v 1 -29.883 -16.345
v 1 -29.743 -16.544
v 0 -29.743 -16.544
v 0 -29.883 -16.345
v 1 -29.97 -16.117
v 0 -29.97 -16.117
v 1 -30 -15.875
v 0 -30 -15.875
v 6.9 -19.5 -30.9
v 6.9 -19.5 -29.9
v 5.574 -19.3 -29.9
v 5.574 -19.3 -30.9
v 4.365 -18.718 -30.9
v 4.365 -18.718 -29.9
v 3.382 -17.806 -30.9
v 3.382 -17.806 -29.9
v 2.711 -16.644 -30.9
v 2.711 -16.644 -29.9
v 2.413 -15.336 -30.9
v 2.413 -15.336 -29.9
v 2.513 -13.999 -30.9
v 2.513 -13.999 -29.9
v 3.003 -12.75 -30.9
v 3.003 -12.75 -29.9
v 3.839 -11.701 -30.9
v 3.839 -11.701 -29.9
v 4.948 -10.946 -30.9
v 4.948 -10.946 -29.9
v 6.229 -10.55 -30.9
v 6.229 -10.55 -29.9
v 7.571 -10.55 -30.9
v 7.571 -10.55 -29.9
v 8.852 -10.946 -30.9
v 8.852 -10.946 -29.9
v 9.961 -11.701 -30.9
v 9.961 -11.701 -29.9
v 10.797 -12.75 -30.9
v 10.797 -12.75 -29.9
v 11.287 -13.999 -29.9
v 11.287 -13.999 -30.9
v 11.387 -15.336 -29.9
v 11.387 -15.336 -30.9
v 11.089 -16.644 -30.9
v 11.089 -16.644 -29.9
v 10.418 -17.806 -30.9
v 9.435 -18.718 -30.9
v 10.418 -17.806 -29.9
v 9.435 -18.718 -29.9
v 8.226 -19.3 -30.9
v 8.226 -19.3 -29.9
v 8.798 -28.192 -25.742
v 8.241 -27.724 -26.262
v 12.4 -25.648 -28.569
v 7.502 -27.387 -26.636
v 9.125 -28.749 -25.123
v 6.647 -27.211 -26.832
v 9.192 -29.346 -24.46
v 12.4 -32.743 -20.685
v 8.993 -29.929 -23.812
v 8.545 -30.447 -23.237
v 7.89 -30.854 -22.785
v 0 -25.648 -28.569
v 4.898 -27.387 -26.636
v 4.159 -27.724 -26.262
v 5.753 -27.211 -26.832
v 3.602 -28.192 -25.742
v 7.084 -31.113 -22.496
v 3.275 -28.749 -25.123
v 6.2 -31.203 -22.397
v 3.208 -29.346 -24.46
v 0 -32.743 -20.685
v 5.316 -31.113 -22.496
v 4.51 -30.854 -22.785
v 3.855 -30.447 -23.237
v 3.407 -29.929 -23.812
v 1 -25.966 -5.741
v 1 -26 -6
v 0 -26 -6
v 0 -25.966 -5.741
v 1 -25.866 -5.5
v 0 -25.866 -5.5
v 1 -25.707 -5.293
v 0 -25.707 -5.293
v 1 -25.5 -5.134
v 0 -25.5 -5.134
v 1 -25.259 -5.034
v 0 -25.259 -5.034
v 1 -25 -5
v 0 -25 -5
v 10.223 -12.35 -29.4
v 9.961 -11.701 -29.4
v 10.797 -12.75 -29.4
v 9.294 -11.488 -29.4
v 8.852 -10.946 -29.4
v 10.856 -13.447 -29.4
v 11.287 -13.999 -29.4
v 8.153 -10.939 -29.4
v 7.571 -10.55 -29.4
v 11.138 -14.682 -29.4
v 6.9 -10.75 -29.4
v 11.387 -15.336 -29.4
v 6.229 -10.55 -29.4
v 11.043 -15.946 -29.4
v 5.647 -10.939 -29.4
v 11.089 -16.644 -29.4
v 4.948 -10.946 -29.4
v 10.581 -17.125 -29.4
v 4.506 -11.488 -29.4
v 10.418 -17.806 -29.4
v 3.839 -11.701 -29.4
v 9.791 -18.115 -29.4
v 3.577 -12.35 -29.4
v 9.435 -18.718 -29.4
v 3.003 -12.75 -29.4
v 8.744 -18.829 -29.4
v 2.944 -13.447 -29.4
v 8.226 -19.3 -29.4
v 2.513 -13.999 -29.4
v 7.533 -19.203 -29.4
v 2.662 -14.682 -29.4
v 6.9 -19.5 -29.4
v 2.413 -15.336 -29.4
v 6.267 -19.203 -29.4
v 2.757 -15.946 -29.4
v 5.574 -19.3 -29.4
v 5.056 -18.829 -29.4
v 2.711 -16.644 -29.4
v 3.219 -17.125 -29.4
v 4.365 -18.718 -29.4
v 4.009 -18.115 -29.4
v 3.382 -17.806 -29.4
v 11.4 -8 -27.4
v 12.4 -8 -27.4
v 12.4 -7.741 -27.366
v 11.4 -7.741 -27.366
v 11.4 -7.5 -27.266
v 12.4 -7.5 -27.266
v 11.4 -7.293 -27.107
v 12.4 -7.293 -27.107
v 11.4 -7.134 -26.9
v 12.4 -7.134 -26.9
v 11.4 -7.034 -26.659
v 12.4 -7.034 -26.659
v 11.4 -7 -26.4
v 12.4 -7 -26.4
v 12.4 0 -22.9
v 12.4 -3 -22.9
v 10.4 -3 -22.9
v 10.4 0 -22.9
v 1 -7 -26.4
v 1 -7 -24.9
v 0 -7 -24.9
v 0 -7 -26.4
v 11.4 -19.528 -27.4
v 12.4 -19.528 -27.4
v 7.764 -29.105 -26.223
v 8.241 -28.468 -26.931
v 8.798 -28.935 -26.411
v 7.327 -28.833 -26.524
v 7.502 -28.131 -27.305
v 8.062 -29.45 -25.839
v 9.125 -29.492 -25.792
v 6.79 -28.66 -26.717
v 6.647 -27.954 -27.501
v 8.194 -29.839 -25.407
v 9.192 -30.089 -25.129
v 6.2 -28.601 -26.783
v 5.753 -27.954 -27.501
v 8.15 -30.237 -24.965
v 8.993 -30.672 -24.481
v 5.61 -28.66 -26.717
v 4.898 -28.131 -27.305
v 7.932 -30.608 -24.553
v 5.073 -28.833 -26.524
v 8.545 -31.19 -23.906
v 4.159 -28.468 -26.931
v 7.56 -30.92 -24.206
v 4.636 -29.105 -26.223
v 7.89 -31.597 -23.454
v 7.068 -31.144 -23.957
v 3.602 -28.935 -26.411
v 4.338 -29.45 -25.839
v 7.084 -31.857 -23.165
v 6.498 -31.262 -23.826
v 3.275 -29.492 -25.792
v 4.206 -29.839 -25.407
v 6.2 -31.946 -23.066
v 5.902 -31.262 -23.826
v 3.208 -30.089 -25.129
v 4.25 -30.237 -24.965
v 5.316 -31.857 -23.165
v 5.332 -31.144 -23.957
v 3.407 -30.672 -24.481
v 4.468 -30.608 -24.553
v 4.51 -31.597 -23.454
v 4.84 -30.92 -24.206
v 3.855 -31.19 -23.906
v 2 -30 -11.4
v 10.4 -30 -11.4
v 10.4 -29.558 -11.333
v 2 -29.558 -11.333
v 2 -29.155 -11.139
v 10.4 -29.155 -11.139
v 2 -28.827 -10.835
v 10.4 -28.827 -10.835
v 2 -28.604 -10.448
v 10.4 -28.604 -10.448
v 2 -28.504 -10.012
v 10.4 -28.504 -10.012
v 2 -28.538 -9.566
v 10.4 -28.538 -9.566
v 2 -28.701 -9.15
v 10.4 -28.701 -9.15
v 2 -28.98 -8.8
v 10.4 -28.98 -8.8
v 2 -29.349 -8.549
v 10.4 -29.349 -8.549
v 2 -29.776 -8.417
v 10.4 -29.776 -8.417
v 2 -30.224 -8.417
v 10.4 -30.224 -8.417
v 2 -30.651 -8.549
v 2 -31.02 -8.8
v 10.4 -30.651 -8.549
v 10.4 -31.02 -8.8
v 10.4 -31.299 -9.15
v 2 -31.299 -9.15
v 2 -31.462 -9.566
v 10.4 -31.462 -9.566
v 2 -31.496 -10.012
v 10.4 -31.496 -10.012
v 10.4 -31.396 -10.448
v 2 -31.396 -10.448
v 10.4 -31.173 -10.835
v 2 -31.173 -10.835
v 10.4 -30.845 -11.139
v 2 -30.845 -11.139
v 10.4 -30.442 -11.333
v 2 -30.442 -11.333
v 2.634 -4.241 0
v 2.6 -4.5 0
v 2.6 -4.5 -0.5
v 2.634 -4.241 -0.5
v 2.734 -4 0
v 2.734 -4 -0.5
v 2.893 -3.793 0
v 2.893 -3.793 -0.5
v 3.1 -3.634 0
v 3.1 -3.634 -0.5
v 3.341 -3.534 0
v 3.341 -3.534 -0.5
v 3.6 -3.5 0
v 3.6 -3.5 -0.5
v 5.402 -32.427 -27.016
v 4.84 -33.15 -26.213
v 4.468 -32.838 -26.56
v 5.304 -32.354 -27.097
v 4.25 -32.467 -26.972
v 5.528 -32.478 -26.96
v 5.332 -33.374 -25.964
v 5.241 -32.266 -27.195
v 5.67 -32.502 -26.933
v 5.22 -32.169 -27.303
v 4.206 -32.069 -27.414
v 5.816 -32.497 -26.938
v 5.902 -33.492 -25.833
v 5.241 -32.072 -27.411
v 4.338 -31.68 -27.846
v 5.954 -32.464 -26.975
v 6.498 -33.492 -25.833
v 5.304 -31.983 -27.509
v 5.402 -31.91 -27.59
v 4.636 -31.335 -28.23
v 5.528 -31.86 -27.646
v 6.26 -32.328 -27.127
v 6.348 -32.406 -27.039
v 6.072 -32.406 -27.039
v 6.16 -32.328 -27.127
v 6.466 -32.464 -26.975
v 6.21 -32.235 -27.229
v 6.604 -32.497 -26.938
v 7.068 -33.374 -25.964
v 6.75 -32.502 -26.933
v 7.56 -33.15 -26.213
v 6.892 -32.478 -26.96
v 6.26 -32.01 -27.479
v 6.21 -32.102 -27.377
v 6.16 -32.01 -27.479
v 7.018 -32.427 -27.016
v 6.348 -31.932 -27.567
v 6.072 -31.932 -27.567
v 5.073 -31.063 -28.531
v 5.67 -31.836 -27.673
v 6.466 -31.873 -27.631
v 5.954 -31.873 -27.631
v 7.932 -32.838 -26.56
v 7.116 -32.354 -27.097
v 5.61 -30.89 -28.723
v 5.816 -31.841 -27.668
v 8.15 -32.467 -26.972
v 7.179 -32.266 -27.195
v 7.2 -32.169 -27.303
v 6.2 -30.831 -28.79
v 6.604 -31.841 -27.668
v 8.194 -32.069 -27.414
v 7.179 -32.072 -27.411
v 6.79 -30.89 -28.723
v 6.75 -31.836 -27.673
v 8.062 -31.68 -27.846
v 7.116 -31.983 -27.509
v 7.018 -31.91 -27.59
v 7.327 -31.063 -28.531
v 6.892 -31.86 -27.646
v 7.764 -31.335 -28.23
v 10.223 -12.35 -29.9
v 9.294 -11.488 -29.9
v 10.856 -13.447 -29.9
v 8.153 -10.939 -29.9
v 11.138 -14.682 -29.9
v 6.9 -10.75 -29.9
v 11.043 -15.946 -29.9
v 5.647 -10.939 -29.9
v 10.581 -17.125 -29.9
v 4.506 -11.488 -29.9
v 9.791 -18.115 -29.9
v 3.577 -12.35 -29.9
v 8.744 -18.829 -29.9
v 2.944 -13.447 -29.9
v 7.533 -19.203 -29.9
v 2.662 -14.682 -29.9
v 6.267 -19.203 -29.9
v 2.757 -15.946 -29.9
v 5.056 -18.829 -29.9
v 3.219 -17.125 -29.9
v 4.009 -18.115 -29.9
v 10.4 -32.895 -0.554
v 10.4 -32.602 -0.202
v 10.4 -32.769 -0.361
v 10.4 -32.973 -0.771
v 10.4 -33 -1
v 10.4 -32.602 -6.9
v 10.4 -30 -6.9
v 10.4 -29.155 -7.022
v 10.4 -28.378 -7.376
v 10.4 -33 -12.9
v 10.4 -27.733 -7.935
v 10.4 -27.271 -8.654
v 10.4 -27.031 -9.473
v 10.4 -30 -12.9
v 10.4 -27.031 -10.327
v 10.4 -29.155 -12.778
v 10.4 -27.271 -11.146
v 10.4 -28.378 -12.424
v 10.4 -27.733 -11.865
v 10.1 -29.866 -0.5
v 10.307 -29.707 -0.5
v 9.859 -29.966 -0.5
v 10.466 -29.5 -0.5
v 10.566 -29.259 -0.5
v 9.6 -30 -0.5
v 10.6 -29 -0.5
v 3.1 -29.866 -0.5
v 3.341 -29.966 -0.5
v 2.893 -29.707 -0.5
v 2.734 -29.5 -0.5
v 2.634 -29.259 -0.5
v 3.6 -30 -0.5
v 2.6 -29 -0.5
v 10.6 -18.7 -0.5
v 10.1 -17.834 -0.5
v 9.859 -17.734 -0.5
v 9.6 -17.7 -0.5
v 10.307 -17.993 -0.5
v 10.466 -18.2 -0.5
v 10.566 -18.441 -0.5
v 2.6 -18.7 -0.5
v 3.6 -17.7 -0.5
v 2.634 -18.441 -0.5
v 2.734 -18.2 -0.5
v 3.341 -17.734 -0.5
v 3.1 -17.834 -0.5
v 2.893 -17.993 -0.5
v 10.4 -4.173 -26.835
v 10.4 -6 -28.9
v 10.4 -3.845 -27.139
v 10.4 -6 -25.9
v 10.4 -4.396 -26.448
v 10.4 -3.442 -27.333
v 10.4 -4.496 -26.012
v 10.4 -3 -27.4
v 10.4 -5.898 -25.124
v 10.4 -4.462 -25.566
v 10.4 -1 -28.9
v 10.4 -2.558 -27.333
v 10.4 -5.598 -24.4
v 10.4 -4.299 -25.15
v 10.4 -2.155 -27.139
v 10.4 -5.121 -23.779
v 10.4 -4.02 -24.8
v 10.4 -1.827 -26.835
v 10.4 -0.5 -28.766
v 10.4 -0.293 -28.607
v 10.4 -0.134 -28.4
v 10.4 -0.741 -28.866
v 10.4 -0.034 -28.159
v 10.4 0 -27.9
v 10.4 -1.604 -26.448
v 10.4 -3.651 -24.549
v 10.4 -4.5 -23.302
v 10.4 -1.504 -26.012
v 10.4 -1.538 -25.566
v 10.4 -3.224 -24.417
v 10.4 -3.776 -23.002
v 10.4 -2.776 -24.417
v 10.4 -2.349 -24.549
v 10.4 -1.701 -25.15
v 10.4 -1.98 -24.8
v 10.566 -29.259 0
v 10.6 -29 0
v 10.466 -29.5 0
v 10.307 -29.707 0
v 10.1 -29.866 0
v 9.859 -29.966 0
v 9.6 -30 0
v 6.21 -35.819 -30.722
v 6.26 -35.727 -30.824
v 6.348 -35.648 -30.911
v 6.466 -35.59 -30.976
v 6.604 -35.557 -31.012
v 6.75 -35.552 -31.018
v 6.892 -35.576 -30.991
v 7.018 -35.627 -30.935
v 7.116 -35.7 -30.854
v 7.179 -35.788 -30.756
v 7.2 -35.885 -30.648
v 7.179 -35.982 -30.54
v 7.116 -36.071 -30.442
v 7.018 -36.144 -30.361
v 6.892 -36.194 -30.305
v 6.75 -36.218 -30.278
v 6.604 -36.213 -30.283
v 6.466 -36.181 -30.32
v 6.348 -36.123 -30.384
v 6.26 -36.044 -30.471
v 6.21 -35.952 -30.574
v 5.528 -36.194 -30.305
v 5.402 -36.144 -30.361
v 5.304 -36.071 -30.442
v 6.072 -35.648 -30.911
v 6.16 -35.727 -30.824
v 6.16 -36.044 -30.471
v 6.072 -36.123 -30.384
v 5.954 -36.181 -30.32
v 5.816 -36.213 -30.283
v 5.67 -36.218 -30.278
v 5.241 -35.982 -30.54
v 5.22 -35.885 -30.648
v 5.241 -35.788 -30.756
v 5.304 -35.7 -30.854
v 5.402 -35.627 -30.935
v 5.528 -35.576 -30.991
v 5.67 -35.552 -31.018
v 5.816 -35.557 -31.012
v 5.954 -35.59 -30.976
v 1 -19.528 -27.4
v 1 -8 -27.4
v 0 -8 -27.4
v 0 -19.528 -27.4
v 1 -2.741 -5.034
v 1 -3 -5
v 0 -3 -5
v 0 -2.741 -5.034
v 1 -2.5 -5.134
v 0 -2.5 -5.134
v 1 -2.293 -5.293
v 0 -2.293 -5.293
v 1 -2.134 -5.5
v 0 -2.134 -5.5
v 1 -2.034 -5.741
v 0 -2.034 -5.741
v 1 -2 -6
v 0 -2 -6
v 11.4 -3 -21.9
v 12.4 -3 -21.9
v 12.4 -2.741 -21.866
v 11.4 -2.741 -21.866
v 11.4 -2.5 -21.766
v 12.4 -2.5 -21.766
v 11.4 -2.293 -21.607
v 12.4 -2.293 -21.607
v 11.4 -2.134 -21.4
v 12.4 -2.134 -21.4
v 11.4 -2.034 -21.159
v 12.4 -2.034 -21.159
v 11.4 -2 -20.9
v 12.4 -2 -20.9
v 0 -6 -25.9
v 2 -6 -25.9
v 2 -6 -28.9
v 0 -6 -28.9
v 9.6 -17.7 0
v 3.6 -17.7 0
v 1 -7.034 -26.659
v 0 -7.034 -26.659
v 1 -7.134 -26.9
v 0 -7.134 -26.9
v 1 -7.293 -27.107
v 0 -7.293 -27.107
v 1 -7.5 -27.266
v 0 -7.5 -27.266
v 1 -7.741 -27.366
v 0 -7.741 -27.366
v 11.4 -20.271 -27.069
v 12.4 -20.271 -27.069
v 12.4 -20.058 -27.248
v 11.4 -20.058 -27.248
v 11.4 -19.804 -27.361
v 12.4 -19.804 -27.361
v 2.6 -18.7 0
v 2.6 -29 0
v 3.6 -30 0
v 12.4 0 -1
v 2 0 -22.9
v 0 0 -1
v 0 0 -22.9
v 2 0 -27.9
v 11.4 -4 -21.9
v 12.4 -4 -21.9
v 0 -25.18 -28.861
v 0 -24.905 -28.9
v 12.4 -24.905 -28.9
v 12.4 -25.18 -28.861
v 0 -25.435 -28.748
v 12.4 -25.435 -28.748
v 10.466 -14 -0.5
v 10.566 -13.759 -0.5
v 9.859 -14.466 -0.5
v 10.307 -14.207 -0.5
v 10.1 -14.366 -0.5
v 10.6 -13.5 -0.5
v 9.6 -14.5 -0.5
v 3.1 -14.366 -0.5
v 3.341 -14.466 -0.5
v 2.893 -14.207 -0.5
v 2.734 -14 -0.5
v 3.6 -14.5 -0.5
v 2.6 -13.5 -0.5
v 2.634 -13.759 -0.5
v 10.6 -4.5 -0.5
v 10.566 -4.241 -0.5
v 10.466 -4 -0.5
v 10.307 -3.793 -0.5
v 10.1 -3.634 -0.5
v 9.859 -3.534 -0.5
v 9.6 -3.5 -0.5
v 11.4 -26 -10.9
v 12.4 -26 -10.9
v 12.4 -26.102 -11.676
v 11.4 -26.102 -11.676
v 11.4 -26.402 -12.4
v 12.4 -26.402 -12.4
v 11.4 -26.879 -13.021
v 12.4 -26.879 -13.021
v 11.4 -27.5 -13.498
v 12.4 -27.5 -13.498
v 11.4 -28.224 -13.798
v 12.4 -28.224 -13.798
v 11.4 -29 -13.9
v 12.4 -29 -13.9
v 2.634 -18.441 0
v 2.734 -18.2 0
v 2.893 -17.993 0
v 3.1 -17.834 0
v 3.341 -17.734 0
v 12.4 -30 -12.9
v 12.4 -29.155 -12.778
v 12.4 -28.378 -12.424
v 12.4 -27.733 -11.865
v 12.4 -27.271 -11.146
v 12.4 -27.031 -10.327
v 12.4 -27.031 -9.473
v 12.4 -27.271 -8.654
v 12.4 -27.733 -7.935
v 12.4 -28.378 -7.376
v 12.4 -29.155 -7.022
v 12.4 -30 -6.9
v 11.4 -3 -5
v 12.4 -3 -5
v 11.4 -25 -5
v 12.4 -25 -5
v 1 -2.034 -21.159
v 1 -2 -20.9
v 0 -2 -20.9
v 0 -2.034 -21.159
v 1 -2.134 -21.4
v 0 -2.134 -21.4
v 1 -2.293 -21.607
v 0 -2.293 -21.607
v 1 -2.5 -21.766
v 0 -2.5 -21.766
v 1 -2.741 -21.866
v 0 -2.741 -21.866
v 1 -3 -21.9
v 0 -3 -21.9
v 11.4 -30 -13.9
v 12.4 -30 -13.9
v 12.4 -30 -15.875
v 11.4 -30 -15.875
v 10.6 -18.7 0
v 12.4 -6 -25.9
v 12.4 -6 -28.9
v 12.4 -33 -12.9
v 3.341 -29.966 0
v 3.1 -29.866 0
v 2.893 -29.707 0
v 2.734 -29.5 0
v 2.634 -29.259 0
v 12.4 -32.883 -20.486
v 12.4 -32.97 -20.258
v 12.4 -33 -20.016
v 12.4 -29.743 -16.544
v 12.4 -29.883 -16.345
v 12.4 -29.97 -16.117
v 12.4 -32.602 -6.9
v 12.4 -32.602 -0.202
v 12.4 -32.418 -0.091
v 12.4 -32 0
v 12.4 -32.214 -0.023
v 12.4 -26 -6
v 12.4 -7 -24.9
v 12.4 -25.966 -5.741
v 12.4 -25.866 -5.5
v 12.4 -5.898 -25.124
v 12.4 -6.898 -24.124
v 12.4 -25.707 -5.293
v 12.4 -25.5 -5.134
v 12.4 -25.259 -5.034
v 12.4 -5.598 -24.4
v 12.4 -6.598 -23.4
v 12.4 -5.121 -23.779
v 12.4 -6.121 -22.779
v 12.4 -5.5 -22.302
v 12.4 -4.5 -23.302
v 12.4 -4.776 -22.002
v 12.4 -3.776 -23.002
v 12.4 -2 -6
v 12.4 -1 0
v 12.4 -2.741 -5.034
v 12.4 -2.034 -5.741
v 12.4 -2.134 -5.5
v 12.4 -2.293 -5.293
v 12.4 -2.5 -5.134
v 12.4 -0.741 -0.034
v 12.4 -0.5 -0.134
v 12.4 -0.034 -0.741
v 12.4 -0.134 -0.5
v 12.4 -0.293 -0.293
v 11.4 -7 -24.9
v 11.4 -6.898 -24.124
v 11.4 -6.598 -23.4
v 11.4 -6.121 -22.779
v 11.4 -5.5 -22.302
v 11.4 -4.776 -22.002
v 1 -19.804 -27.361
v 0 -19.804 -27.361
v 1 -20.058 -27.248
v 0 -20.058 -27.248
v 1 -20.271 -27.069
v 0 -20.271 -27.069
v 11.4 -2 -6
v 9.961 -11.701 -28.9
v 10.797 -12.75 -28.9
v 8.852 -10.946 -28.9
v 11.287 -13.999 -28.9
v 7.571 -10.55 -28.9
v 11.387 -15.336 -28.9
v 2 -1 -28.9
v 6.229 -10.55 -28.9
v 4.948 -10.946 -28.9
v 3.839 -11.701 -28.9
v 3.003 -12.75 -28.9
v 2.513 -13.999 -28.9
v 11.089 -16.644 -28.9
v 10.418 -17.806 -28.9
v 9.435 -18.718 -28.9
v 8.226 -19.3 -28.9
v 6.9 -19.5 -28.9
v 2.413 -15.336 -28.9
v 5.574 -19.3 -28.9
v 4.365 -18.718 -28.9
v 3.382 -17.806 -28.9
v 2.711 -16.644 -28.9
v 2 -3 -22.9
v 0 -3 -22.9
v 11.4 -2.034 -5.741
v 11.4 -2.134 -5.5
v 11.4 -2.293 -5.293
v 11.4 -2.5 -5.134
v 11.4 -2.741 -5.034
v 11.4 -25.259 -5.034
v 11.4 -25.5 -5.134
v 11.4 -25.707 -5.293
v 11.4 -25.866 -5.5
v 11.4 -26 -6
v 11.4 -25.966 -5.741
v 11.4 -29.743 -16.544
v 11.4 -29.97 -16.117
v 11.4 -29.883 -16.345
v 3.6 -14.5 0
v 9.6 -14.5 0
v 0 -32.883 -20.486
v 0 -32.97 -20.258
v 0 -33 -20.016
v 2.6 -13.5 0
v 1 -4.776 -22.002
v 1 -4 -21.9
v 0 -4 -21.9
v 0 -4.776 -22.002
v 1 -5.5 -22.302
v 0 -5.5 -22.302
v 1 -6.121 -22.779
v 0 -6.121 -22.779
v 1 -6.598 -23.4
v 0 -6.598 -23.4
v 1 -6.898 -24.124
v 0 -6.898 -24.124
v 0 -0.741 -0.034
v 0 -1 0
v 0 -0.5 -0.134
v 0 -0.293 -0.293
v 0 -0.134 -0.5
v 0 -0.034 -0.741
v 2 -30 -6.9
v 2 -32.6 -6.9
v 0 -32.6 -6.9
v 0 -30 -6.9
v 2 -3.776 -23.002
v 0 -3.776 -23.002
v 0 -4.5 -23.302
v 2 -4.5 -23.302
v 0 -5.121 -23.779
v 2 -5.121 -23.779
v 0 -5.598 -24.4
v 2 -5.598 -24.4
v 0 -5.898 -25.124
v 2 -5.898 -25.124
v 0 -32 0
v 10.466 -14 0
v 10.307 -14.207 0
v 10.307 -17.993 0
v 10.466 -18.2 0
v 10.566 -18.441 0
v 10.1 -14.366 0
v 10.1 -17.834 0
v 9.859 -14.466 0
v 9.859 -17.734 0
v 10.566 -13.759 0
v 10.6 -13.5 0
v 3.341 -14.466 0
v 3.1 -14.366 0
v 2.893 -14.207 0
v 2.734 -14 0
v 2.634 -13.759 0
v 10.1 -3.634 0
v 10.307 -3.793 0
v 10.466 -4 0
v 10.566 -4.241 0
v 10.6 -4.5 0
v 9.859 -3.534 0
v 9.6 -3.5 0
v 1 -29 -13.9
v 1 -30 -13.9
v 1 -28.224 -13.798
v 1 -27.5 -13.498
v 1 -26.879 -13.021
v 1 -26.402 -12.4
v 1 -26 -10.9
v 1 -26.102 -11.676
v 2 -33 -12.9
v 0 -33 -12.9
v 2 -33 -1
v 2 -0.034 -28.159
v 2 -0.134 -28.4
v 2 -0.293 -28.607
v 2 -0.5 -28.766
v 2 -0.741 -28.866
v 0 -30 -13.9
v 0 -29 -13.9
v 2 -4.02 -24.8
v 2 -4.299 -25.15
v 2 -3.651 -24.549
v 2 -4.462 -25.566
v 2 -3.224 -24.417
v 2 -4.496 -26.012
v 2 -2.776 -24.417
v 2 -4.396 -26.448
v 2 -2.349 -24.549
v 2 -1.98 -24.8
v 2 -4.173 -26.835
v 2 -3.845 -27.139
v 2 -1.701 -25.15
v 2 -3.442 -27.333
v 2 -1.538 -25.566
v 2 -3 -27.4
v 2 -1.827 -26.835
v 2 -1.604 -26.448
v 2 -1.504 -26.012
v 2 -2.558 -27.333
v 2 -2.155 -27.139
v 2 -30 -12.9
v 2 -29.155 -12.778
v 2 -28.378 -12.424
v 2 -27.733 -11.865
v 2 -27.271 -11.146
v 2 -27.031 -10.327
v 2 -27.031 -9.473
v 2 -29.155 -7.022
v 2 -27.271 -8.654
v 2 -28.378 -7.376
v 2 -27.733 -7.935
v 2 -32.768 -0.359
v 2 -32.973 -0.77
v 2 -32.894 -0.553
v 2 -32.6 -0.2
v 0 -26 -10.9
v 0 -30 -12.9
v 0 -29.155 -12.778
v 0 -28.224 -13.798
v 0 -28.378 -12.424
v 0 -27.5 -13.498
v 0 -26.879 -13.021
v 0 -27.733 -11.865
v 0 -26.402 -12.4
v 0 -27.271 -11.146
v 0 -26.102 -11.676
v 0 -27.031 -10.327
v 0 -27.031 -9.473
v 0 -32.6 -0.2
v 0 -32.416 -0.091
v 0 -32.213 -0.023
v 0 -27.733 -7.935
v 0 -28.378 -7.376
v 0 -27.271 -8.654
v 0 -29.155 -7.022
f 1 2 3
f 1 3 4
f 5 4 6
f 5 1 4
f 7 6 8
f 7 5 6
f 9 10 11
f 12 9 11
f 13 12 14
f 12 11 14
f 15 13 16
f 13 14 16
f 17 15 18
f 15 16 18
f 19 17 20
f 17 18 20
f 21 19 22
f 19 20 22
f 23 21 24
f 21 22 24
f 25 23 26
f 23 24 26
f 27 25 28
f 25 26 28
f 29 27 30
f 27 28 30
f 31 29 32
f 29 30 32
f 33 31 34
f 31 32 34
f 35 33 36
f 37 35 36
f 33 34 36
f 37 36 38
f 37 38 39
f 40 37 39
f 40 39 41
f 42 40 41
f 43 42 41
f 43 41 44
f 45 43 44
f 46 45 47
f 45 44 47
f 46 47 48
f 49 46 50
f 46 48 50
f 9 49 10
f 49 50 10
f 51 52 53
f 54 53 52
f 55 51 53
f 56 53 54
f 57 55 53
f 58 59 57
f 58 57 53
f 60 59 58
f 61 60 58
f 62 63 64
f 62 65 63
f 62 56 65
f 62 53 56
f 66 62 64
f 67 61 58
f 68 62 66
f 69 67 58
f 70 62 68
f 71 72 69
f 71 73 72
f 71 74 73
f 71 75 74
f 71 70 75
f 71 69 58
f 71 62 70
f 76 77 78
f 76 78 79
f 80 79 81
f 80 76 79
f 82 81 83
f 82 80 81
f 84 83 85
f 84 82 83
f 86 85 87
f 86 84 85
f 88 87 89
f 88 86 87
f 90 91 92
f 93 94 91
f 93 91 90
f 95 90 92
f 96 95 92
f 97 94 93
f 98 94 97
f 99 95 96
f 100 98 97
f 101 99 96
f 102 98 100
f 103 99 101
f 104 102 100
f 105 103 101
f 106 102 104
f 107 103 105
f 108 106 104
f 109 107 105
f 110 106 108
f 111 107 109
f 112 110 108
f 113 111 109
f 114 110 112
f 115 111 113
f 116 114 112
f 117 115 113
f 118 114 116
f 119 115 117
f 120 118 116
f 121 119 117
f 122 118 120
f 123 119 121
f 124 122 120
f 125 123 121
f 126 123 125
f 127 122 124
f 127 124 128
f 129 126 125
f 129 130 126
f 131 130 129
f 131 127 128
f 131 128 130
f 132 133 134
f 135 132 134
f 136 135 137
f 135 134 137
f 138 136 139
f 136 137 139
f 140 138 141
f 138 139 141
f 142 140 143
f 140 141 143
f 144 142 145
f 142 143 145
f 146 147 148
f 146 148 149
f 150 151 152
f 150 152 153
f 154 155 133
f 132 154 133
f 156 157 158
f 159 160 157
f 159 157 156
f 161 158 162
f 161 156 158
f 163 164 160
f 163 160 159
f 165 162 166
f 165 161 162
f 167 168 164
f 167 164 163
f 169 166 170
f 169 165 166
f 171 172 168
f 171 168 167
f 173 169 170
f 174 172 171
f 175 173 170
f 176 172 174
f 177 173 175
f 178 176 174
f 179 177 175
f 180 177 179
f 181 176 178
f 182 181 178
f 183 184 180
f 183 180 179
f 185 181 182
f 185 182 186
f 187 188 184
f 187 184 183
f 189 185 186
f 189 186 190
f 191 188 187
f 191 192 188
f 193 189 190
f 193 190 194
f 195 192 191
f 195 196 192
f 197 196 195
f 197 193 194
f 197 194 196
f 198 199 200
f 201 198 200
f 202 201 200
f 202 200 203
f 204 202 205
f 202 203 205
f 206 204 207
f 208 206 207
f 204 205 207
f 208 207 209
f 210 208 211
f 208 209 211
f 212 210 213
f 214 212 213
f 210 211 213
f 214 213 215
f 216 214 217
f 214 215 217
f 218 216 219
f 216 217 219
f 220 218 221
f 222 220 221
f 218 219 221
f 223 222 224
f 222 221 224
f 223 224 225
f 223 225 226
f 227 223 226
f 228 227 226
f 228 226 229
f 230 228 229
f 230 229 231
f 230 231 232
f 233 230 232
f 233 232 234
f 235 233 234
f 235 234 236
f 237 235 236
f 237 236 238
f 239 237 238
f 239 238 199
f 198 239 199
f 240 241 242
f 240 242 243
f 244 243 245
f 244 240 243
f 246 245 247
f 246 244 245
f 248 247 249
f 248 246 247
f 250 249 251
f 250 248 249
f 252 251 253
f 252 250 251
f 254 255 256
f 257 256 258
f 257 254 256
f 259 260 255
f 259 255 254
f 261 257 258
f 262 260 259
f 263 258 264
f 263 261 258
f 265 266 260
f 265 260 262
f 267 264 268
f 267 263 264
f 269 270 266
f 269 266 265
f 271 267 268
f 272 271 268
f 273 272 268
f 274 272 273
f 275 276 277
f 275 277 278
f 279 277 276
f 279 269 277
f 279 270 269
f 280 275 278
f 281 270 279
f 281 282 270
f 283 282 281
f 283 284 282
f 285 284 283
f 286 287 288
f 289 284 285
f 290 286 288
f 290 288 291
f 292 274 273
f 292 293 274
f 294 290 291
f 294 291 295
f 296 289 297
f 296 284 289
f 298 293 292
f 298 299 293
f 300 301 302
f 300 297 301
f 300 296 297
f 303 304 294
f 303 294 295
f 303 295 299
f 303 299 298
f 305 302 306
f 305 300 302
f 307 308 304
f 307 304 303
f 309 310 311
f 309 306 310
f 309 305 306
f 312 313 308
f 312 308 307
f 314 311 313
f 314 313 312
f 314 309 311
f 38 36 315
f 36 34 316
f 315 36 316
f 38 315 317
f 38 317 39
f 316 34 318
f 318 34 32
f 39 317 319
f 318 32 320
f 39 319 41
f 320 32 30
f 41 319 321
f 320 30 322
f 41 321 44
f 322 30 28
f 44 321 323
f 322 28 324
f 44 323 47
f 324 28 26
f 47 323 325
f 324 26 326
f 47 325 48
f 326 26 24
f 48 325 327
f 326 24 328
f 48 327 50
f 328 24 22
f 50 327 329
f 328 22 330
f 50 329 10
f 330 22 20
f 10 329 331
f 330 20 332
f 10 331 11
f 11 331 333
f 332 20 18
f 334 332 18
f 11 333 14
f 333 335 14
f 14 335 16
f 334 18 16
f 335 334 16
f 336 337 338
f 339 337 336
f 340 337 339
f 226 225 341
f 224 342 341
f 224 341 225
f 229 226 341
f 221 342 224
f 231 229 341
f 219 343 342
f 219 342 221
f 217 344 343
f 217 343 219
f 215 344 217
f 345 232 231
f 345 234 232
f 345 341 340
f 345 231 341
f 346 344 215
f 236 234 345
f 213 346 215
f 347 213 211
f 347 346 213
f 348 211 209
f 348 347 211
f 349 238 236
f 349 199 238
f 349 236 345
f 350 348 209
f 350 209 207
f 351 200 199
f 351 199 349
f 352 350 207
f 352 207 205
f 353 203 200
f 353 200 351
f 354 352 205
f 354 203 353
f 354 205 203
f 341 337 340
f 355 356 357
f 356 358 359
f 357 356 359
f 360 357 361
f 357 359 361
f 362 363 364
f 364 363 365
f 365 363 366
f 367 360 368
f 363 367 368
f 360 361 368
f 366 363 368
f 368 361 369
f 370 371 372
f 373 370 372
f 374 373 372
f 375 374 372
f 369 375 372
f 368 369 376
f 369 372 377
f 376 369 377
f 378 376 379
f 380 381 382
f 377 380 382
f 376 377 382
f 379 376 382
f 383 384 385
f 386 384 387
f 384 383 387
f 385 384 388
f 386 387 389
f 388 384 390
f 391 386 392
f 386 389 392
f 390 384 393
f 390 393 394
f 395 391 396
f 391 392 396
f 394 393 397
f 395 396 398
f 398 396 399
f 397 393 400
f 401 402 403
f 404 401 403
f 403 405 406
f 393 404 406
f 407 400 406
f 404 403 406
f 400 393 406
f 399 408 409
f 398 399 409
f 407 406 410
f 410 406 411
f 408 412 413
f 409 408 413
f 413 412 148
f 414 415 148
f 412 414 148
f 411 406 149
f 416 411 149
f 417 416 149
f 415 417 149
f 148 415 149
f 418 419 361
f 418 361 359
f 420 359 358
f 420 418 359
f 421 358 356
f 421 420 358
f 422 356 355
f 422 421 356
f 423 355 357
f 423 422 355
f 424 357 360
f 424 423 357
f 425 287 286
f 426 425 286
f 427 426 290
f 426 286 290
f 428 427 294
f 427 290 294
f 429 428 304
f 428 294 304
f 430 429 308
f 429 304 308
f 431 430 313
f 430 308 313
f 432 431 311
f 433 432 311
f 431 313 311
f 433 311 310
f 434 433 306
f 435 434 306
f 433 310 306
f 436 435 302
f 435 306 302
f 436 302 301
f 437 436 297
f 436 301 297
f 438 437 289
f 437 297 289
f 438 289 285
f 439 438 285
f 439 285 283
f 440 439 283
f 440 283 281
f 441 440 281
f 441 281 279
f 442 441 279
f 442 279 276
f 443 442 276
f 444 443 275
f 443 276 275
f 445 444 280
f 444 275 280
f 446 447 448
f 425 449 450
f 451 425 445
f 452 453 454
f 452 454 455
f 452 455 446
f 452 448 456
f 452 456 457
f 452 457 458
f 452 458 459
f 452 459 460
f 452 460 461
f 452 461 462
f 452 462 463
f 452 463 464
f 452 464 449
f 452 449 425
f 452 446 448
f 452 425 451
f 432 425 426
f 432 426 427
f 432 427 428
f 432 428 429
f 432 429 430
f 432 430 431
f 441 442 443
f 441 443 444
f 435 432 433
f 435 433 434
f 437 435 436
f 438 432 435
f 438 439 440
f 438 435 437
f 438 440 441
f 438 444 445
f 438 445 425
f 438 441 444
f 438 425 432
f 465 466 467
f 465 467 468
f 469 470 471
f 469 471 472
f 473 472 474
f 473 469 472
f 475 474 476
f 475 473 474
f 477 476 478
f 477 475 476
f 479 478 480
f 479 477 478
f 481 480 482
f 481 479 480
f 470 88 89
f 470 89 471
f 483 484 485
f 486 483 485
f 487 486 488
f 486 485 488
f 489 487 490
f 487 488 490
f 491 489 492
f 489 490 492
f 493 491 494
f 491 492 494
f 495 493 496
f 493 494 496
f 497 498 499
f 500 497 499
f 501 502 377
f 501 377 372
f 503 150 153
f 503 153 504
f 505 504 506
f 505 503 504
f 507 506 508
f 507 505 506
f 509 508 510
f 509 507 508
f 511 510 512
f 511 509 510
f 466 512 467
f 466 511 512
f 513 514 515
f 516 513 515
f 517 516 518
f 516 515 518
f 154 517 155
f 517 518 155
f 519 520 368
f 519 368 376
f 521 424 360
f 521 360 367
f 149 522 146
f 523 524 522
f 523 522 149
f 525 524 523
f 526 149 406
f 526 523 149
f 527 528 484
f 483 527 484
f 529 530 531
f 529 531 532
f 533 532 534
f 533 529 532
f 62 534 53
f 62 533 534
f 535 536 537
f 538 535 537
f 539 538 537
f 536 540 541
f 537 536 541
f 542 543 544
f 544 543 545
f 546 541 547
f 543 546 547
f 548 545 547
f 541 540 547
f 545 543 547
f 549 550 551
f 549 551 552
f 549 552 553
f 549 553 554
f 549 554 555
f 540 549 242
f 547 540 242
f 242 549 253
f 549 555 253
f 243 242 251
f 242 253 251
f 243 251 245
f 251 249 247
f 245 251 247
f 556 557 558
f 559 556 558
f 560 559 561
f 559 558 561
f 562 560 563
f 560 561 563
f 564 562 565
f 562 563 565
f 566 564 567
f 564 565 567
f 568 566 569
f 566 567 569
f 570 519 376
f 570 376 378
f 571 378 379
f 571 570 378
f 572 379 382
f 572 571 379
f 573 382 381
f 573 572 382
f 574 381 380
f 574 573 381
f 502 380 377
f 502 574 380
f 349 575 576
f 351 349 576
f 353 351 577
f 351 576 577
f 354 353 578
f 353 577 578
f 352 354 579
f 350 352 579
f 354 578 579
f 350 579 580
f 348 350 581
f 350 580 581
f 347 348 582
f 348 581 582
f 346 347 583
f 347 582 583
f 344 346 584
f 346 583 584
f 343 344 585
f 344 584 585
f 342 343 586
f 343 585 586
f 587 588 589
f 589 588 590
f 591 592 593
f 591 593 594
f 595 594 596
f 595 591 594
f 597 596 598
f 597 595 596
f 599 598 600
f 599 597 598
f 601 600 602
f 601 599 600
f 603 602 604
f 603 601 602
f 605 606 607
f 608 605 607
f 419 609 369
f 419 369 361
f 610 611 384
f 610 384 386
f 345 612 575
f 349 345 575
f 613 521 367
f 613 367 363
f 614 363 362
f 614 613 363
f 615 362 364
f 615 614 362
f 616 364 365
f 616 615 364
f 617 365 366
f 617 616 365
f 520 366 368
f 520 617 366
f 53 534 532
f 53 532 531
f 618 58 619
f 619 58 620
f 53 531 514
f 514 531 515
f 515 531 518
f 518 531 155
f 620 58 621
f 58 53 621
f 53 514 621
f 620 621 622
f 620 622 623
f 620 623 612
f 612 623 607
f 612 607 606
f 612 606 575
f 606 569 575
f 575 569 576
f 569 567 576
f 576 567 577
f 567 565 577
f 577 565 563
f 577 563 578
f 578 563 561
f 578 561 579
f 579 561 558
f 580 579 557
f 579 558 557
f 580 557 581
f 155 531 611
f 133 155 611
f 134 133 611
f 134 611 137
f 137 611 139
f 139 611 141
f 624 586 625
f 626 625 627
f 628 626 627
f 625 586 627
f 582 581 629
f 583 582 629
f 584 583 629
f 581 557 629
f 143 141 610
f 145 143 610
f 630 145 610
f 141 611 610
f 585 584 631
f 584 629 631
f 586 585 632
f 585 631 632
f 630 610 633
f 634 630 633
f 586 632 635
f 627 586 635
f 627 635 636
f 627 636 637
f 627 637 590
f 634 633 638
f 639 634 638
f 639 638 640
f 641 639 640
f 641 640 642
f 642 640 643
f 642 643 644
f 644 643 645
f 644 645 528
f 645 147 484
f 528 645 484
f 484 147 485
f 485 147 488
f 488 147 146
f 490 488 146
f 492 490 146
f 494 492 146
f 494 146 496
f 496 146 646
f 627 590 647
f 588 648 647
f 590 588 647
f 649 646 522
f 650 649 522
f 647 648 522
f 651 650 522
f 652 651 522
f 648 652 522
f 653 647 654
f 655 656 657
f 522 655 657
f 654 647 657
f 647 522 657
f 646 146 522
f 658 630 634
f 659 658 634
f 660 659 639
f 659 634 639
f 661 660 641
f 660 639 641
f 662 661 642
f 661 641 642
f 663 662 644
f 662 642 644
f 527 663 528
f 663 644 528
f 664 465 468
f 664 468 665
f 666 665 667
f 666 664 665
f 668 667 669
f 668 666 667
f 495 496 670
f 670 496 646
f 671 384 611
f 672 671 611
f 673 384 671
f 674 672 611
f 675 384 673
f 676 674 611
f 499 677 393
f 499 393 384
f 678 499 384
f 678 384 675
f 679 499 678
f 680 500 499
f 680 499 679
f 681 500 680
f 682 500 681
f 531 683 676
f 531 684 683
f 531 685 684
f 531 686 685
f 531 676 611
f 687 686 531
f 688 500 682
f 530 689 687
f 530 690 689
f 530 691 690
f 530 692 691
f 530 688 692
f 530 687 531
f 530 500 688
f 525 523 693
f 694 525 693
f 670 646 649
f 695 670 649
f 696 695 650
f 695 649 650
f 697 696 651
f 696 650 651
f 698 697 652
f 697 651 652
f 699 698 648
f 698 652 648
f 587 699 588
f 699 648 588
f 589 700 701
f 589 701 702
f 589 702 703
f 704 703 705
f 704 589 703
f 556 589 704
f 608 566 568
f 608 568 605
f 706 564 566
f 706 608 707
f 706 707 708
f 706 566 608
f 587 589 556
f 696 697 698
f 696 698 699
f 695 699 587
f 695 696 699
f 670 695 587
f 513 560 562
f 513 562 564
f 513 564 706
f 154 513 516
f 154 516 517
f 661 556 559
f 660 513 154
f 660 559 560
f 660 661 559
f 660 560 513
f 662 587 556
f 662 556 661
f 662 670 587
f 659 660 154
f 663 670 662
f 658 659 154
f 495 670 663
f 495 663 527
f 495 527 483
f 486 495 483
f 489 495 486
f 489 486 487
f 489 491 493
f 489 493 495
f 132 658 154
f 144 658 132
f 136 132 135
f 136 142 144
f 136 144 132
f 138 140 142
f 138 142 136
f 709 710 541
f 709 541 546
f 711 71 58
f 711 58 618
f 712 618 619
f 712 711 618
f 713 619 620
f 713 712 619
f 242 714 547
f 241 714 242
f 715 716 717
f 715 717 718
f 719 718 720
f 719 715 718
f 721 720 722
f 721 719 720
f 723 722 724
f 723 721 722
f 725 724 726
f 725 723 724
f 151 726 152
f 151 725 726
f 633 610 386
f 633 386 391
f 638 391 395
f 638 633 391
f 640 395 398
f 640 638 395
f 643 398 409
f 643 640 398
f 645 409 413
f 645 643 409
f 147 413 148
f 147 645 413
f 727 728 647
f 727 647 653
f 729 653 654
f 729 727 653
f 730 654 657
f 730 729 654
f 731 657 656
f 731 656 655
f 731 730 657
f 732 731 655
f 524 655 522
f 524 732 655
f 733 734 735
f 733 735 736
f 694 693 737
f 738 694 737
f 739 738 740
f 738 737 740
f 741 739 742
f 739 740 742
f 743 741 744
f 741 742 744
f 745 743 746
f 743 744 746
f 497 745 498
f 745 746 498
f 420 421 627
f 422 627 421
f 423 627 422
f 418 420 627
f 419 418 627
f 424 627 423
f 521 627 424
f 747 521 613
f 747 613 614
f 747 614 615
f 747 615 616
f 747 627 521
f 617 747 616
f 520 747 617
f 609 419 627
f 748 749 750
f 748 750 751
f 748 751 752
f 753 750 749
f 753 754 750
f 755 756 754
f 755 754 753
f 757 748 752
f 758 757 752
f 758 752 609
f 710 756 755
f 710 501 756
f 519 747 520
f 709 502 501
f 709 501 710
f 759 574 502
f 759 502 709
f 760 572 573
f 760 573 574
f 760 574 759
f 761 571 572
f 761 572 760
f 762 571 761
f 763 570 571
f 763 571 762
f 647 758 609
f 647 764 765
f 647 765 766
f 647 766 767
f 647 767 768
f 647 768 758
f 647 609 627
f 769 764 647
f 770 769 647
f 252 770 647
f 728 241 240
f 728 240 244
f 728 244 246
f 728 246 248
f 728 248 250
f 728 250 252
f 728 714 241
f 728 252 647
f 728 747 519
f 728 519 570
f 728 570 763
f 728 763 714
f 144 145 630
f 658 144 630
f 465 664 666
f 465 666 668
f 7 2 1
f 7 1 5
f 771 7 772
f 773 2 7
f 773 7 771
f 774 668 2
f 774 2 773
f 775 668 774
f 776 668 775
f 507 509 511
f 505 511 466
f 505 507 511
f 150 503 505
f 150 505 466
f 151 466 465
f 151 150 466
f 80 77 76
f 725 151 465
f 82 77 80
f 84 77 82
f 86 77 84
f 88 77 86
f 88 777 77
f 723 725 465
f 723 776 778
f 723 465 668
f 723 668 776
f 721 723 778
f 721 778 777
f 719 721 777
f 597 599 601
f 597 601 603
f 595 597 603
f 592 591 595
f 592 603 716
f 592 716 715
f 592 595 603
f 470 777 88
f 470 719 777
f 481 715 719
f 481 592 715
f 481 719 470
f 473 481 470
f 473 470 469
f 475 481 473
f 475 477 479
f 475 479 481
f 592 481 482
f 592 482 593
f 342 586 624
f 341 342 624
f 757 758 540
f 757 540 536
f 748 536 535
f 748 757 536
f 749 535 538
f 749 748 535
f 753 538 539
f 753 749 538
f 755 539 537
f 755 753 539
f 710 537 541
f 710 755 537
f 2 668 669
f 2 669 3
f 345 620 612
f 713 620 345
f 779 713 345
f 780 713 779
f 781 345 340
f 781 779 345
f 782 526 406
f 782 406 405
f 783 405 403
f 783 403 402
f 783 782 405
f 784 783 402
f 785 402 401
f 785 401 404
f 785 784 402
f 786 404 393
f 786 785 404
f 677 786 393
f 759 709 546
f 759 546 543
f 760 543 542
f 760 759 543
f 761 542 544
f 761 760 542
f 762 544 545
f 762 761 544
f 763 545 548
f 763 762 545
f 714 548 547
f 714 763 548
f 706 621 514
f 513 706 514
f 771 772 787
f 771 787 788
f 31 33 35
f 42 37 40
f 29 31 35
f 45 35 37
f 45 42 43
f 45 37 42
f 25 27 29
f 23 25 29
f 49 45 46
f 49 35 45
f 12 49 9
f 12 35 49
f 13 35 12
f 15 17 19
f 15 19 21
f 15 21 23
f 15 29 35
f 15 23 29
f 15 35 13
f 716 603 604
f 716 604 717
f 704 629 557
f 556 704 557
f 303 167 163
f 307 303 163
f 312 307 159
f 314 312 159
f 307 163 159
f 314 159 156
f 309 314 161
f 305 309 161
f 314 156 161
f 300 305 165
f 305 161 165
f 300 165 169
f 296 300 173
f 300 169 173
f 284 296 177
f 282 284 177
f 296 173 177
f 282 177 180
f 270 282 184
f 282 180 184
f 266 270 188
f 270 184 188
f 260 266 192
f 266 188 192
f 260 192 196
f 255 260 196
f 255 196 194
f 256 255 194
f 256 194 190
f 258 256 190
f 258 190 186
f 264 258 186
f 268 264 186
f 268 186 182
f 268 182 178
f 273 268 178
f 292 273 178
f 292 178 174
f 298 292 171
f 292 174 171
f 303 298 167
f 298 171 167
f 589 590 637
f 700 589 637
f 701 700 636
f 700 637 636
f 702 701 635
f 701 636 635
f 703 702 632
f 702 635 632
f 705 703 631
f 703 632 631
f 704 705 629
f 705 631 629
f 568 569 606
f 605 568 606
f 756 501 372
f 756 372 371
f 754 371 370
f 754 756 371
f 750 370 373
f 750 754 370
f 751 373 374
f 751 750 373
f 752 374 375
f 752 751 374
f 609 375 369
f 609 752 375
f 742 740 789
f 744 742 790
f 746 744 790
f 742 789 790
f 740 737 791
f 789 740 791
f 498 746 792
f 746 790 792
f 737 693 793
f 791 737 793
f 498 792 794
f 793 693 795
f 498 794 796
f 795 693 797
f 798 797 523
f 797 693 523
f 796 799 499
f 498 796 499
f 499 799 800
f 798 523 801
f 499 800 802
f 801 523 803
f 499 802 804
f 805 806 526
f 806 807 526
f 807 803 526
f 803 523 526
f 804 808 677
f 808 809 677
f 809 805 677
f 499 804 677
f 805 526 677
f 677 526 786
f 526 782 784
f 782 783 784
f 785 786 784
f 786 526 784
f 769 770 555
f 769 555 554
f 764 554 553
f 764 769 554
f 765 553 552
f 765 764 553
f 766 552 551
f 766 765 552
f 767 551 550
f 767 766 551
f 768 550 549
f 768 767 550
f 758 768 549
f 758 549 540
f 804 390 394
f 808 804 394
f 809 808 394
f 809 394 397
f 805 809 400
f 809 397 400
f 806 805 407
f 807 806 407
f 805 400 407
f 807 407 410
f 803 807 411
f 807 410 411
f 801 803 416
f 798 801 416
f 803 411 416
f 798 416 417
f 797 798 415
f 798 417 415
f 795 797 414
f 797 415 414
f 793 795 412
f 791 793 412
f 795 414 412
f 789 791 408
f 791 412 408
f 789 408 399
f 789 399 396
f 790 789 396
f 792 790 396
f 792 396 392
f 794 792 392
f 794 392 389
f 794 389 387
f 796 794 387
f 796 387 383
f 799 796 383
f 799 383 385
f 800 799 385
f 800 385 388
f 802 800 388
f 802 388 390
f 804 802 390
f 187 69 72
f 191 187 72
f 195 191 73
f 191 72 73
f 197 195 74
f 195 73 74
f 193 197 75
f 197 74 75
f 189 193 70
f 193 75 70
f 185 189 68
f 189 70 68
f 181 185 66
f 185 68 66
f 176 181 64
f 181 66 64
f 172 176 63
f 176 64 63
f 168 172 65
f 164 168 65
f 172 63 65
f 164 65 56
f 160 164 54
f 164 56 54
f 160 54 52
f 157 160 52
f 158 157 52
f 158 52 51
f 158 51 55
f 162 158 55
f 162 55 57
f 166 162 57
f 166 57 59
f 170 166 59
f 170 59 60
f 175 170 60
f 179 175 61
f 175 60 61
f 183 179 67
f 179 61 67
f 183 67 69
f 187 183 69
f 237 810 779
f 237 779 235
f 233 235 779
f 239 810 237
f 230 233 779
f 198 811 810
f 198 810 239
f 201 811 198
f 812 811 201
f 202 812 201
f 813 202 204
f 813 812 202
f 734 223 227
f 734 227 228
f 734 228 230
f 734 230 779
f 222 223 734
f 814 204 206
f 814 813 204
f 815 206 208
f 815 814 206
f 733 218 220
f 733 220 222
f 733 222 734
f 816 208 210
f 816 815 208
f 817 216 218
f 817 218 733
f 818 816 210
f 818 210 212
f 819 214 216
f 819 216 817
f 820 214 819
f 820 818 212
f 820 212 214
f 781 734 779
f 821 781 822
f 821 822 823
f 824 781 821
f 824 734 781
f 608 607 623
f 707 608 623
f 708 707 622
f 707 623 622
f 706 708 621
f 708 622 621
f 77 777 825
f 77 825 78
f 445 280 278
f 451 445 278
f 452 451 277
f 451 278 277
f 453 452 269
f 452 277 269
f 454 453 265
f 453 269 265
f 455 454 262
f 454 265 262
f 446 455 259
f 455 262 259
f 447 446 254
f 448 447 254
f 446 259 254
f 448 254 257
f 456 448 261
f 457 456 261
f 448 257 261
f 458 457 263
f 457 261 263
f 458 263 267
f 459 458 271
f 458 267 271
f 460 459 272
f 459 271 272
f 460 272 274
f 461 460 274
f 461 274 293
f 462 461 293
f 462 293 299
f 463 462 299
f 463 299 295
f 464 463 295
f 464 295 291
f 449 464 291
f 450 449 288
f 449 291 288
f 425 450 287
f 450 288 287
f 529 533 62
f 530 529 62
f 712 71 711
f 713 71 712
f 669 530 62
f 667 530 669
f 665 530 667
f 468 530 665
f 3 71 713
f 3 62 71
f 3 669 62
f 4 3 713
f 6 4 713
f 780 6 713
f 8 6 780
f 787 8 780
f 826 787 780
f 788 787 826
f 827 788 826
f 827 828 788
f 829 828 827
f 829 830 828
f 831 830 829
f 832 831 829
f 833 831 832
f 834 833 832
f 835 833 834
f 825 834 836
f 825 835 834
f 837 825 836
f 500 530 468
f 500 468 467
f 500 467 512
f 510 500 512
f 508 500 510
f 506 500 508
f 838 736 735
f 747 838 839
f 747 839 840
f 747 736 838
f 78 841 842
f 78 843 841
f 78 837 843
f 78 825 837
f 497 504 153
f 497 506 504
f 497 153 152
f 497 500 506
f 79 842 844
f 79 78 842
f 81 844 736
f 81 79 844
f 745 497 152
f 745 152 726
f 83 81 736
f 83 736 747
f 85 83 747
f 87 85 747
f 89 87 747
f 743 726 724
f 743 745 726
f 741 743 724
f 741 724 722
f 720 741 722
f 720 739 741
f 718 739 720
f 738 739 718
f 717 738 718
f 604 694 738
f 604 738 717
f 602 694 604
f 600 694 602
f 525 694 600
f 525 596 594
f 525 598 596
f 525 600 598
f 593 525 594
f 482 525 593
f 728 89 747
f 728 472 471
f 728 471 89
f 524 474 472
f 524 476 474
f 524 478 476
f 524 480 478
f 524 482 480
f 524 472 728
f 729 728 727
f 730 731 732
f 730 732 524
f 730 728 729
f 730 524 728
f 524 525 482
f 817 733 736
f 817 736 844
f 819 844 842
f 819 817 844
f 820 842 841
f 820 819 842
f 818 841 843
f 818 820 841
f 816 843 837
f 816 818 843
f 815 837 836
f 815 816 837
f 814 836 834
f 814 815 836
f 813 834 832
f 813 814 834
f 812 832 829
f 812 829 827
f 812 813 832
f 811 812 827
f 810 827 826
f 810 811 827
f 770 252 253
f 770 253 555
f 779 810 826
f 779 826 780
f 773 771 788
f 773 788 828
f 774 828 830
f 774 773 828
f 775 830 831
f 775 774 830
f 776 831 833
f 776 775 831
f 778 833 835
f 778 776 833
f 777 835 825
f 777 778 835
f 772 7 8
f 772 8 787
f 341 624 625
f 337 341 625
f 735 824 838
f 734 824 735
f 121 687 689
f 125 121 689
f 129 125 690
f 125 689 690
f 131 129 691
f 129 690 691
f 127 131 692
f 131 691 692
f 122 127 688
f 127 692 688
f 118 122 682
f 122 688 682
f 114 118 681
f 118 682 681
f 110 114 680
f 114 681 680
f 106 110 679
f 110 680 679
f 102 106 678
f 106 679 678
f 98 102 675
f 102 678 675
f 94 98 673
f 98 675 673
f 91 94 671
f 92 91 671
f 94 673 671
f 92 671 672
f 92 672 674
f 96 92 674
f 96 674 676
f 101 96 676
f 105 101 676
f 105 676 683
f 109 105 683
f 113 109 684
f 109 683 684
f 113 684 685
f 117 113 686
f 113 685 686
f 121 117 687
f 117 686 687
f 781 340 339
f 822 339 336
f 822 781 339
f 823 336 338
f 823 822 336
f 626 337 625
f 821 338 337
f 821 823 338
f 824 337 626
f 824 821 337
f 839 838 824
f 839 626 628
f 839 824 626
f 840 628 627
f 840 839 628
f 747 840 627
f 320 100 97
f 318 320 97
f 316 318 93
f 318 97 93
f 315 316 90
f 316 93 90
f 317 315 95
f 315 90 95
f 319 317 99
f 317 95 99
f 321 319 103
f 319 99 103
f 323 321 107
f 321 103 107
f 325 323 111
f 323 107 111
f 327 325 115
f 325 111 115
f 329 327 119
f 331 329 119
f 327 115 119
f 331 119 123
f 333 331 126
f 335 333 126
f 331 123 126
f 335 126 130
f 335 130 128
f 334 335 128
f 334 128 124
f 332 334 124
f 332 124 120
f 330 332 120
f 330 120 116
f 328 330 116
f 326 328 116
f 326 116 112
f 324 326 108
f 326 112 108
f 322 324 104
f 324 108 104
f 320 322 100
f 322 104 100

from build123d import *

# Parameters (mm, degrees)
BOSS_EXTRUDE1_DEPTH = 12.4
SKETCH2_R           = 1.5
CUT_EXTRUDE1_DEPTH  = 46.584756224
CUT_EXTRUDE2_DEPTH  = 2
CUT_EXTRUDE3_START  = -2
CUT_EXTRUDE3_DEPTH  = 2
CUT_EXTRUDE4_DEPTH  = 1
CUT_EXTRUDE5_START  = -1
CUT_EXTRUDE5_DEPTH  = 1
CUT_EXTRUDE6_DEPTH  = 0.5
SKETCH9_R           = 4.5
BOSS_EXTRUDE2_DEPTH = 0.5
SKETCH10_R          = 4.25
BOSS_EXTRUDE3_DEPTH = 0.5
SKETCH11_R          = 4.5
BOSS_EXTRUDE4_DEPTH = 1
SKETCH12_R          = 3
BOSS_EXTRUDE5_DEPTH = 1
SKETCH13_R          = 2
BOSS_EXTRUDE6_DEPTH = 3
BOSS_EXTRUDE7_DEPTH = 5


with BuildPart() as part:
    # Sketch1 → Boss-Extrude1 (new body)
    with BuildSketch(Plane(origin=(0, 0, 0), x_dir=(0, 0, -1), z_dir=(1, 0, 0))):
        with BuildLine():
            Line((1, 0), (27.9, 0))
            ThreePointArc((27.9, 0), (28.607106781, -0.292893219), (28.9, -1))
            Line((28.9, -1), (28.9, -24.904637595))
            ThreePointArc((28.9, -24.904637595), (28.813500063, -25.31147618), (28.568964732, -25.647931742))
            Line((28.568964732, -25.647931742), (20.685228726, -32.743294146))
            ThreePointArc((20.685228726, -32.743294146), (20.374527762, -32.933620412), (20.016263995, -33))
            Line((20.016263995, -33), (1, -33))
            ThreePointArc((1, -33), (0.292893219, -32.707106781), (0, -32))
            Line((0, -32), (0, -1))
            ThreePointArc((0, -1), (0.292893219, -0.292893219), (1, 0))
        make_face()
    extrude(amount=BOSS_EXTRUDE1_DEPTH)

    # Sketch2 → Cut-Extrude1 (cut, through all)
    with BuildSketch(Plane(origin=(12.4, 0, 0), x_dir=(0, 0, -1), z_dir=(1, 0, 0))):
        with Locations((25.9, -3)):
            Circle(SKETCH2_R)
        with Locations((9.9, -30)):
            Circle(SKETCH2_R)
    extrude(amount=-CUT_EXTRUDE1_DEPTH, mode=Mode.SUBTRACT)

    # Sketch3 → Cut-Extrude2 (cut)
    with BuildSketch(Plane(origin=(12.4, 0, 0), x_dir=(0, 0, -1), z_dir=(1, 0, 0))):
        with BuildLine():
            Line((6.9, -30), (6.9, -32.602246067))
            Line((6.9, -32.602246067), (0, -32.602246067))
            Line((0, -32.602246067), (0, -33))
            Line((0, -33), (6.9, -33))
            Line((6.9, -33), (12.9, -33))
            Line((12.9, -33), (12.9, -30))
            ThreePointArc((12.9, -30), (9.9, -27), (6.9, -30))
        make_face()
        with BuildLine():
            Line((22.9, 0), (28.9, 0))
            Line((28.9, 0), (28.9, -6))
            Line((28.9, -6), (25.9, -6))
            ThreePointArc((25.9, -6), (23.778679656, -5.121320344), (22.9, -3))
            Line((22.9, -3), (22.9, 0))
        make_face()
    extrude(amount=-CUT_EXTRUDE2_DEPTH, mode=Mode.SUBTRACT)

    # Sketch4 → Cut-Extrude3 (cut)
    with BuildSketch(Plane.ZY.offset(CUT_EXTRUDE3_START)):
        with BuildLine():
            Line((-12.9, -30), (-12.9, -33))
            Line((-12.9, -33), (-6.9, -33))
            Line((-6.9, -33), (0, -33))
            Line((0, -33), (0, -32.6))
            Line((0, -32.6), (-6.9, -32.6))
            Line((-6.9, -32.6), (-6.9, -30))
            ThreePointArc((-6.9, -30), (-9.9, -27), (-12.9, -30))
        make_face()
        with BuildLine():
            Line((-28.9, 0), (-22.9, 0))
            Line((-22.9, 0), (-22.9, -3))
            ThreePointArc((-22.9, -3), (-23.778679656, -5.121320344), (-25.9, -6))
            Line((-25.9, -6), (-28.9, -6))
            Line((-28.9, -6), (-28.9, 0))
        make_face()
    extrude(amount=CUT_EXTRUDE3_DEPTH, mode=Mode.SUBTRACT)

    # Sketch5 → Cut-Extrude4 (cut)
    with BuildSketch(Plane(origin=(12.4, 0, 0), x_dir=(0, 0, -1), z_dir=(1, 0, 0))):
        with BuildLine():
            Line((5, -3), (5, -25))
            ThreePointArc((5, -25), (5.292893219, -25.707106781), (6, -26))
            Line((6, -26), (10.9, -26))
            ThreePointArc((10.9, -26), (13.021320344, -26.878679656), (13.9, -29))
            Line((13.9, -29), (13.9, -30))
            Line((13.9, -30), (15.875361746, -30))
            ThreePointArc((15.875361746, -30), (16.233625514, -29.933620412), (16.544326478, -29.743294146))
            Line((16.544326478, -29.743294146), (27.068964732, -20.271119718))
            ThreePointArc((27.068964732, -20.271119718), (27.313500063, -19.934664157), (27.4, -19.527825572))
            Line((27.4, -19.527825572), (27.4, -8))
            ThreePointArc((27.4, -8), (27.107106781, -7.292893219), (26.4, -7))
            Line((26.4, -7), (24.9, -7))
            ThreePointArc((24.9, -7), (22.778679656, -6.121320344), (21.9, -4))
            Line((21.9, -4), (21.9, -3))
            ThreePointArc((21.9, -3), (21.607106781, -2.292893219), (20.9, -2))
            Line((20.9, -2), (6, -2))
            ThreePointArc((6, -2), (5.292893219, -2.292893219), (5, -3))
        make_face()
    extrude(amount=-CUT_EXTRUDE4_DEPTH, mode=Mode.SUBTRACT)

    # Sketch6 → Cut-Extrude5 (cut)
    with BuildSketch(Plane.ZY.offset(CUT_EXTRUDE5_START)):
        with BuildLine():
            Line((-6, -2), (-20.9, -2))
            ThreePointArc((-20.9, -2), (-21.607106781, -2.292893219), (-21.9, -3))
            Line((-21.9, -3), (-21.9, -4))
            ThreePointArc((-21.9, -4), (-22.778679656, -6.121320344), (-24.9, -7))
            Line((-24.9, -7), (-26.4, -7))
            ThreePointArc((-26.4, -7), (-27.107106781, -7.292893219), (-27.4, -8))
            Line((-27.4, -8), (-27.4, -19.527825572))
            ThreePointArc((-27.4, -19.527825572), (-27.313500063, -19.934664157), (-27.068964732, -20.271119718))
            Line((-27.068964732, -20.271119718), (-16.544326478, -29.743294146))
            ThreePointArc((-16.544326478, -29.743294146), (-16.233625514, -29.933620412), (-15.875361746, -30))
            Line((-15.875361746, -30), (-13.9, -30))
            Line((-13.9, -30), (-13.9, -29))
            ThreePointArc((-13.9, -29), (-13.021320344, -26.878679656), (-10.9, -26))
            Line((-10.9, -26), (-6, -26))
            ThreePointArc((-6, -26), (-5.292893219, -25.707106781), (-5, -25))
            Line((-5, -25), (-5, -3))
            ThreePointArc((-5, -3), (-5.292893219, -2.292893219), (-6, -2))
        make_face()
    extrude(amount=CUT_EXTRUDE5_DEPTH, mode=Mode.SUBTRACT)

    # Sketch8 → Cut-Extrude6 (cut)
    with BuildSketch(Plane.XY):
        with BuildLine():
            Line((3.6, -3.5), (9.6, -3.5))
            ThreePointArc((9.6, -3.5), (10.307106781, -3.792893219), (10.6, -4.5))
            Line((10.6, -4.5), (10.6, -13.5))
            ThreePointArc((10.6, -13.5), (10.307106781, -14.207106781), (9.6, -14.5))
            Line((9.6, -14.5), (3.6, -14.5))
            ThreePointArc((3.6, -14.5), (2.892893219, -14.207106781), (2.6, -13.5))
            Line((2.6, -13.5), (2.6, -4.5))
            ThreePointArc((2.6, -4.5), (2.892893219, -3.792893219), (3.6, -3.5))
        make_face()
        with BuildLine():
            Line((3.6, -17.7), (9.6, -17.7))
            ThreePointArc((9.6, -17.7), (10.307106781, -17.992893219), (10.6, -18.7))
            Line((10.6, -18.7), (10.6, -29))
            ThreePointArc((10.6, -29), (10.307106781, -29.707106781), (9.6, -30))
            Line((9.6, -30), (3.6, -30))
            ThreePointArc((3.6, -30), (2.892893219, -29.707106781), (2.6, -29))
            Line((2.6, -29), (2.6, -18.7))
            ThreePointArc((2.6, -18.7), (2.892893219, -17.992893219), (3.6, -17.7))
        make_face()
    extrude(amount=-CUT_EXTRUDE6_DEPTH, mode=Mode.SUBTRACT)

    # Sketch9 → Boss-Extrude2 (add)
    with BuildSketch(Plane(origin=(0, 0, -28.9), x_dir=(-1, 0, 0), z_dir=(0, 0, -1))):
        with Locations(Location((-6.9, -15, 0), (0, 0, 270))):
            Circle(SKETCH9_R)
    extrude(amount=BOSS_EXTRUDE2_DEPTH)

    # Sketch10 → Boss-Extrude3 (add)
    with BuildSketch(Plane(origin=(0, 0, -29.4), x_dir=(-1, 0, 0), z_dir=(0, 0, -1))):
        with Locations(Location((-6.9, -15, 0), (0, 0, 90))):
            Circle(SKETCH10_R)
    extrude(amount=BOSS_EXTRUDE3_DEPTH)

    # Sketch11 → Boss-Extrude4 (add)
    with BuildSketch(Plane(origin=(0, 0, -29.9), x_dir=(-1, 0, 0), z_dir=(0, 0, -1))):
        with Locations(Location((-6.9, -15, 0), (0, 0, 270))):
            Circle(SKETCH11_R)
    extrude(amount=BOSS_EXTRUDE4_DEPTH)

    # Sketch12 → Boss-Extrude5 (add)
    with BuildSketch(Plane(origin=(0, -28.375690608, -25.538121547), x_dir=(1, 0, 0), z_dir=(0, -0.7432941462471664, -0.6689647316224496))):
        with Locations(Location((6.2, 1.22565854, 0), (0, 0, 90))):
            Circle(SKETCH12_R)
    extrude(amount=BOSS_EXTRUDE5_DEPTH)

    # Sketch13 → Boss-Extrude6 (add)
    with BuildSketch(Plane(origin=(0, -29.118984754, -26.207086279), x_dir=(1, 0, 0), z_dir=(0, -0.7432941462471664, -0.6689647316224496))):
        with Locations(Location((6.2, 1.22565854, 0), (0, 0, 270))):
            Circle(SKETCH13_R)
    extrude(amount=BOSS_EXTRUDE6_DEPTH)

    # Sketch14 → Boss-Extrude7 (add)
    with BuildSketch(Plane(origin=(0, -31.348867193, -28.213980473), x_dir=(1, 0, 0), z_dir=(0, -0.7432941462471664, -0.6689647316224496))):
        with BuildLine():
            ThreePointArc((6.21, 1.126159796), (7.2, 1.22565854), (6.21, 1.325157284))
            ThreePointArc((6.21, 1.325157284), (5.22, 1.22565854), (6.21, 1.126159796))
        make_face()
    extrude(amount=BOSS_EXTRUDE7_DEPTH)


solid = part.part
